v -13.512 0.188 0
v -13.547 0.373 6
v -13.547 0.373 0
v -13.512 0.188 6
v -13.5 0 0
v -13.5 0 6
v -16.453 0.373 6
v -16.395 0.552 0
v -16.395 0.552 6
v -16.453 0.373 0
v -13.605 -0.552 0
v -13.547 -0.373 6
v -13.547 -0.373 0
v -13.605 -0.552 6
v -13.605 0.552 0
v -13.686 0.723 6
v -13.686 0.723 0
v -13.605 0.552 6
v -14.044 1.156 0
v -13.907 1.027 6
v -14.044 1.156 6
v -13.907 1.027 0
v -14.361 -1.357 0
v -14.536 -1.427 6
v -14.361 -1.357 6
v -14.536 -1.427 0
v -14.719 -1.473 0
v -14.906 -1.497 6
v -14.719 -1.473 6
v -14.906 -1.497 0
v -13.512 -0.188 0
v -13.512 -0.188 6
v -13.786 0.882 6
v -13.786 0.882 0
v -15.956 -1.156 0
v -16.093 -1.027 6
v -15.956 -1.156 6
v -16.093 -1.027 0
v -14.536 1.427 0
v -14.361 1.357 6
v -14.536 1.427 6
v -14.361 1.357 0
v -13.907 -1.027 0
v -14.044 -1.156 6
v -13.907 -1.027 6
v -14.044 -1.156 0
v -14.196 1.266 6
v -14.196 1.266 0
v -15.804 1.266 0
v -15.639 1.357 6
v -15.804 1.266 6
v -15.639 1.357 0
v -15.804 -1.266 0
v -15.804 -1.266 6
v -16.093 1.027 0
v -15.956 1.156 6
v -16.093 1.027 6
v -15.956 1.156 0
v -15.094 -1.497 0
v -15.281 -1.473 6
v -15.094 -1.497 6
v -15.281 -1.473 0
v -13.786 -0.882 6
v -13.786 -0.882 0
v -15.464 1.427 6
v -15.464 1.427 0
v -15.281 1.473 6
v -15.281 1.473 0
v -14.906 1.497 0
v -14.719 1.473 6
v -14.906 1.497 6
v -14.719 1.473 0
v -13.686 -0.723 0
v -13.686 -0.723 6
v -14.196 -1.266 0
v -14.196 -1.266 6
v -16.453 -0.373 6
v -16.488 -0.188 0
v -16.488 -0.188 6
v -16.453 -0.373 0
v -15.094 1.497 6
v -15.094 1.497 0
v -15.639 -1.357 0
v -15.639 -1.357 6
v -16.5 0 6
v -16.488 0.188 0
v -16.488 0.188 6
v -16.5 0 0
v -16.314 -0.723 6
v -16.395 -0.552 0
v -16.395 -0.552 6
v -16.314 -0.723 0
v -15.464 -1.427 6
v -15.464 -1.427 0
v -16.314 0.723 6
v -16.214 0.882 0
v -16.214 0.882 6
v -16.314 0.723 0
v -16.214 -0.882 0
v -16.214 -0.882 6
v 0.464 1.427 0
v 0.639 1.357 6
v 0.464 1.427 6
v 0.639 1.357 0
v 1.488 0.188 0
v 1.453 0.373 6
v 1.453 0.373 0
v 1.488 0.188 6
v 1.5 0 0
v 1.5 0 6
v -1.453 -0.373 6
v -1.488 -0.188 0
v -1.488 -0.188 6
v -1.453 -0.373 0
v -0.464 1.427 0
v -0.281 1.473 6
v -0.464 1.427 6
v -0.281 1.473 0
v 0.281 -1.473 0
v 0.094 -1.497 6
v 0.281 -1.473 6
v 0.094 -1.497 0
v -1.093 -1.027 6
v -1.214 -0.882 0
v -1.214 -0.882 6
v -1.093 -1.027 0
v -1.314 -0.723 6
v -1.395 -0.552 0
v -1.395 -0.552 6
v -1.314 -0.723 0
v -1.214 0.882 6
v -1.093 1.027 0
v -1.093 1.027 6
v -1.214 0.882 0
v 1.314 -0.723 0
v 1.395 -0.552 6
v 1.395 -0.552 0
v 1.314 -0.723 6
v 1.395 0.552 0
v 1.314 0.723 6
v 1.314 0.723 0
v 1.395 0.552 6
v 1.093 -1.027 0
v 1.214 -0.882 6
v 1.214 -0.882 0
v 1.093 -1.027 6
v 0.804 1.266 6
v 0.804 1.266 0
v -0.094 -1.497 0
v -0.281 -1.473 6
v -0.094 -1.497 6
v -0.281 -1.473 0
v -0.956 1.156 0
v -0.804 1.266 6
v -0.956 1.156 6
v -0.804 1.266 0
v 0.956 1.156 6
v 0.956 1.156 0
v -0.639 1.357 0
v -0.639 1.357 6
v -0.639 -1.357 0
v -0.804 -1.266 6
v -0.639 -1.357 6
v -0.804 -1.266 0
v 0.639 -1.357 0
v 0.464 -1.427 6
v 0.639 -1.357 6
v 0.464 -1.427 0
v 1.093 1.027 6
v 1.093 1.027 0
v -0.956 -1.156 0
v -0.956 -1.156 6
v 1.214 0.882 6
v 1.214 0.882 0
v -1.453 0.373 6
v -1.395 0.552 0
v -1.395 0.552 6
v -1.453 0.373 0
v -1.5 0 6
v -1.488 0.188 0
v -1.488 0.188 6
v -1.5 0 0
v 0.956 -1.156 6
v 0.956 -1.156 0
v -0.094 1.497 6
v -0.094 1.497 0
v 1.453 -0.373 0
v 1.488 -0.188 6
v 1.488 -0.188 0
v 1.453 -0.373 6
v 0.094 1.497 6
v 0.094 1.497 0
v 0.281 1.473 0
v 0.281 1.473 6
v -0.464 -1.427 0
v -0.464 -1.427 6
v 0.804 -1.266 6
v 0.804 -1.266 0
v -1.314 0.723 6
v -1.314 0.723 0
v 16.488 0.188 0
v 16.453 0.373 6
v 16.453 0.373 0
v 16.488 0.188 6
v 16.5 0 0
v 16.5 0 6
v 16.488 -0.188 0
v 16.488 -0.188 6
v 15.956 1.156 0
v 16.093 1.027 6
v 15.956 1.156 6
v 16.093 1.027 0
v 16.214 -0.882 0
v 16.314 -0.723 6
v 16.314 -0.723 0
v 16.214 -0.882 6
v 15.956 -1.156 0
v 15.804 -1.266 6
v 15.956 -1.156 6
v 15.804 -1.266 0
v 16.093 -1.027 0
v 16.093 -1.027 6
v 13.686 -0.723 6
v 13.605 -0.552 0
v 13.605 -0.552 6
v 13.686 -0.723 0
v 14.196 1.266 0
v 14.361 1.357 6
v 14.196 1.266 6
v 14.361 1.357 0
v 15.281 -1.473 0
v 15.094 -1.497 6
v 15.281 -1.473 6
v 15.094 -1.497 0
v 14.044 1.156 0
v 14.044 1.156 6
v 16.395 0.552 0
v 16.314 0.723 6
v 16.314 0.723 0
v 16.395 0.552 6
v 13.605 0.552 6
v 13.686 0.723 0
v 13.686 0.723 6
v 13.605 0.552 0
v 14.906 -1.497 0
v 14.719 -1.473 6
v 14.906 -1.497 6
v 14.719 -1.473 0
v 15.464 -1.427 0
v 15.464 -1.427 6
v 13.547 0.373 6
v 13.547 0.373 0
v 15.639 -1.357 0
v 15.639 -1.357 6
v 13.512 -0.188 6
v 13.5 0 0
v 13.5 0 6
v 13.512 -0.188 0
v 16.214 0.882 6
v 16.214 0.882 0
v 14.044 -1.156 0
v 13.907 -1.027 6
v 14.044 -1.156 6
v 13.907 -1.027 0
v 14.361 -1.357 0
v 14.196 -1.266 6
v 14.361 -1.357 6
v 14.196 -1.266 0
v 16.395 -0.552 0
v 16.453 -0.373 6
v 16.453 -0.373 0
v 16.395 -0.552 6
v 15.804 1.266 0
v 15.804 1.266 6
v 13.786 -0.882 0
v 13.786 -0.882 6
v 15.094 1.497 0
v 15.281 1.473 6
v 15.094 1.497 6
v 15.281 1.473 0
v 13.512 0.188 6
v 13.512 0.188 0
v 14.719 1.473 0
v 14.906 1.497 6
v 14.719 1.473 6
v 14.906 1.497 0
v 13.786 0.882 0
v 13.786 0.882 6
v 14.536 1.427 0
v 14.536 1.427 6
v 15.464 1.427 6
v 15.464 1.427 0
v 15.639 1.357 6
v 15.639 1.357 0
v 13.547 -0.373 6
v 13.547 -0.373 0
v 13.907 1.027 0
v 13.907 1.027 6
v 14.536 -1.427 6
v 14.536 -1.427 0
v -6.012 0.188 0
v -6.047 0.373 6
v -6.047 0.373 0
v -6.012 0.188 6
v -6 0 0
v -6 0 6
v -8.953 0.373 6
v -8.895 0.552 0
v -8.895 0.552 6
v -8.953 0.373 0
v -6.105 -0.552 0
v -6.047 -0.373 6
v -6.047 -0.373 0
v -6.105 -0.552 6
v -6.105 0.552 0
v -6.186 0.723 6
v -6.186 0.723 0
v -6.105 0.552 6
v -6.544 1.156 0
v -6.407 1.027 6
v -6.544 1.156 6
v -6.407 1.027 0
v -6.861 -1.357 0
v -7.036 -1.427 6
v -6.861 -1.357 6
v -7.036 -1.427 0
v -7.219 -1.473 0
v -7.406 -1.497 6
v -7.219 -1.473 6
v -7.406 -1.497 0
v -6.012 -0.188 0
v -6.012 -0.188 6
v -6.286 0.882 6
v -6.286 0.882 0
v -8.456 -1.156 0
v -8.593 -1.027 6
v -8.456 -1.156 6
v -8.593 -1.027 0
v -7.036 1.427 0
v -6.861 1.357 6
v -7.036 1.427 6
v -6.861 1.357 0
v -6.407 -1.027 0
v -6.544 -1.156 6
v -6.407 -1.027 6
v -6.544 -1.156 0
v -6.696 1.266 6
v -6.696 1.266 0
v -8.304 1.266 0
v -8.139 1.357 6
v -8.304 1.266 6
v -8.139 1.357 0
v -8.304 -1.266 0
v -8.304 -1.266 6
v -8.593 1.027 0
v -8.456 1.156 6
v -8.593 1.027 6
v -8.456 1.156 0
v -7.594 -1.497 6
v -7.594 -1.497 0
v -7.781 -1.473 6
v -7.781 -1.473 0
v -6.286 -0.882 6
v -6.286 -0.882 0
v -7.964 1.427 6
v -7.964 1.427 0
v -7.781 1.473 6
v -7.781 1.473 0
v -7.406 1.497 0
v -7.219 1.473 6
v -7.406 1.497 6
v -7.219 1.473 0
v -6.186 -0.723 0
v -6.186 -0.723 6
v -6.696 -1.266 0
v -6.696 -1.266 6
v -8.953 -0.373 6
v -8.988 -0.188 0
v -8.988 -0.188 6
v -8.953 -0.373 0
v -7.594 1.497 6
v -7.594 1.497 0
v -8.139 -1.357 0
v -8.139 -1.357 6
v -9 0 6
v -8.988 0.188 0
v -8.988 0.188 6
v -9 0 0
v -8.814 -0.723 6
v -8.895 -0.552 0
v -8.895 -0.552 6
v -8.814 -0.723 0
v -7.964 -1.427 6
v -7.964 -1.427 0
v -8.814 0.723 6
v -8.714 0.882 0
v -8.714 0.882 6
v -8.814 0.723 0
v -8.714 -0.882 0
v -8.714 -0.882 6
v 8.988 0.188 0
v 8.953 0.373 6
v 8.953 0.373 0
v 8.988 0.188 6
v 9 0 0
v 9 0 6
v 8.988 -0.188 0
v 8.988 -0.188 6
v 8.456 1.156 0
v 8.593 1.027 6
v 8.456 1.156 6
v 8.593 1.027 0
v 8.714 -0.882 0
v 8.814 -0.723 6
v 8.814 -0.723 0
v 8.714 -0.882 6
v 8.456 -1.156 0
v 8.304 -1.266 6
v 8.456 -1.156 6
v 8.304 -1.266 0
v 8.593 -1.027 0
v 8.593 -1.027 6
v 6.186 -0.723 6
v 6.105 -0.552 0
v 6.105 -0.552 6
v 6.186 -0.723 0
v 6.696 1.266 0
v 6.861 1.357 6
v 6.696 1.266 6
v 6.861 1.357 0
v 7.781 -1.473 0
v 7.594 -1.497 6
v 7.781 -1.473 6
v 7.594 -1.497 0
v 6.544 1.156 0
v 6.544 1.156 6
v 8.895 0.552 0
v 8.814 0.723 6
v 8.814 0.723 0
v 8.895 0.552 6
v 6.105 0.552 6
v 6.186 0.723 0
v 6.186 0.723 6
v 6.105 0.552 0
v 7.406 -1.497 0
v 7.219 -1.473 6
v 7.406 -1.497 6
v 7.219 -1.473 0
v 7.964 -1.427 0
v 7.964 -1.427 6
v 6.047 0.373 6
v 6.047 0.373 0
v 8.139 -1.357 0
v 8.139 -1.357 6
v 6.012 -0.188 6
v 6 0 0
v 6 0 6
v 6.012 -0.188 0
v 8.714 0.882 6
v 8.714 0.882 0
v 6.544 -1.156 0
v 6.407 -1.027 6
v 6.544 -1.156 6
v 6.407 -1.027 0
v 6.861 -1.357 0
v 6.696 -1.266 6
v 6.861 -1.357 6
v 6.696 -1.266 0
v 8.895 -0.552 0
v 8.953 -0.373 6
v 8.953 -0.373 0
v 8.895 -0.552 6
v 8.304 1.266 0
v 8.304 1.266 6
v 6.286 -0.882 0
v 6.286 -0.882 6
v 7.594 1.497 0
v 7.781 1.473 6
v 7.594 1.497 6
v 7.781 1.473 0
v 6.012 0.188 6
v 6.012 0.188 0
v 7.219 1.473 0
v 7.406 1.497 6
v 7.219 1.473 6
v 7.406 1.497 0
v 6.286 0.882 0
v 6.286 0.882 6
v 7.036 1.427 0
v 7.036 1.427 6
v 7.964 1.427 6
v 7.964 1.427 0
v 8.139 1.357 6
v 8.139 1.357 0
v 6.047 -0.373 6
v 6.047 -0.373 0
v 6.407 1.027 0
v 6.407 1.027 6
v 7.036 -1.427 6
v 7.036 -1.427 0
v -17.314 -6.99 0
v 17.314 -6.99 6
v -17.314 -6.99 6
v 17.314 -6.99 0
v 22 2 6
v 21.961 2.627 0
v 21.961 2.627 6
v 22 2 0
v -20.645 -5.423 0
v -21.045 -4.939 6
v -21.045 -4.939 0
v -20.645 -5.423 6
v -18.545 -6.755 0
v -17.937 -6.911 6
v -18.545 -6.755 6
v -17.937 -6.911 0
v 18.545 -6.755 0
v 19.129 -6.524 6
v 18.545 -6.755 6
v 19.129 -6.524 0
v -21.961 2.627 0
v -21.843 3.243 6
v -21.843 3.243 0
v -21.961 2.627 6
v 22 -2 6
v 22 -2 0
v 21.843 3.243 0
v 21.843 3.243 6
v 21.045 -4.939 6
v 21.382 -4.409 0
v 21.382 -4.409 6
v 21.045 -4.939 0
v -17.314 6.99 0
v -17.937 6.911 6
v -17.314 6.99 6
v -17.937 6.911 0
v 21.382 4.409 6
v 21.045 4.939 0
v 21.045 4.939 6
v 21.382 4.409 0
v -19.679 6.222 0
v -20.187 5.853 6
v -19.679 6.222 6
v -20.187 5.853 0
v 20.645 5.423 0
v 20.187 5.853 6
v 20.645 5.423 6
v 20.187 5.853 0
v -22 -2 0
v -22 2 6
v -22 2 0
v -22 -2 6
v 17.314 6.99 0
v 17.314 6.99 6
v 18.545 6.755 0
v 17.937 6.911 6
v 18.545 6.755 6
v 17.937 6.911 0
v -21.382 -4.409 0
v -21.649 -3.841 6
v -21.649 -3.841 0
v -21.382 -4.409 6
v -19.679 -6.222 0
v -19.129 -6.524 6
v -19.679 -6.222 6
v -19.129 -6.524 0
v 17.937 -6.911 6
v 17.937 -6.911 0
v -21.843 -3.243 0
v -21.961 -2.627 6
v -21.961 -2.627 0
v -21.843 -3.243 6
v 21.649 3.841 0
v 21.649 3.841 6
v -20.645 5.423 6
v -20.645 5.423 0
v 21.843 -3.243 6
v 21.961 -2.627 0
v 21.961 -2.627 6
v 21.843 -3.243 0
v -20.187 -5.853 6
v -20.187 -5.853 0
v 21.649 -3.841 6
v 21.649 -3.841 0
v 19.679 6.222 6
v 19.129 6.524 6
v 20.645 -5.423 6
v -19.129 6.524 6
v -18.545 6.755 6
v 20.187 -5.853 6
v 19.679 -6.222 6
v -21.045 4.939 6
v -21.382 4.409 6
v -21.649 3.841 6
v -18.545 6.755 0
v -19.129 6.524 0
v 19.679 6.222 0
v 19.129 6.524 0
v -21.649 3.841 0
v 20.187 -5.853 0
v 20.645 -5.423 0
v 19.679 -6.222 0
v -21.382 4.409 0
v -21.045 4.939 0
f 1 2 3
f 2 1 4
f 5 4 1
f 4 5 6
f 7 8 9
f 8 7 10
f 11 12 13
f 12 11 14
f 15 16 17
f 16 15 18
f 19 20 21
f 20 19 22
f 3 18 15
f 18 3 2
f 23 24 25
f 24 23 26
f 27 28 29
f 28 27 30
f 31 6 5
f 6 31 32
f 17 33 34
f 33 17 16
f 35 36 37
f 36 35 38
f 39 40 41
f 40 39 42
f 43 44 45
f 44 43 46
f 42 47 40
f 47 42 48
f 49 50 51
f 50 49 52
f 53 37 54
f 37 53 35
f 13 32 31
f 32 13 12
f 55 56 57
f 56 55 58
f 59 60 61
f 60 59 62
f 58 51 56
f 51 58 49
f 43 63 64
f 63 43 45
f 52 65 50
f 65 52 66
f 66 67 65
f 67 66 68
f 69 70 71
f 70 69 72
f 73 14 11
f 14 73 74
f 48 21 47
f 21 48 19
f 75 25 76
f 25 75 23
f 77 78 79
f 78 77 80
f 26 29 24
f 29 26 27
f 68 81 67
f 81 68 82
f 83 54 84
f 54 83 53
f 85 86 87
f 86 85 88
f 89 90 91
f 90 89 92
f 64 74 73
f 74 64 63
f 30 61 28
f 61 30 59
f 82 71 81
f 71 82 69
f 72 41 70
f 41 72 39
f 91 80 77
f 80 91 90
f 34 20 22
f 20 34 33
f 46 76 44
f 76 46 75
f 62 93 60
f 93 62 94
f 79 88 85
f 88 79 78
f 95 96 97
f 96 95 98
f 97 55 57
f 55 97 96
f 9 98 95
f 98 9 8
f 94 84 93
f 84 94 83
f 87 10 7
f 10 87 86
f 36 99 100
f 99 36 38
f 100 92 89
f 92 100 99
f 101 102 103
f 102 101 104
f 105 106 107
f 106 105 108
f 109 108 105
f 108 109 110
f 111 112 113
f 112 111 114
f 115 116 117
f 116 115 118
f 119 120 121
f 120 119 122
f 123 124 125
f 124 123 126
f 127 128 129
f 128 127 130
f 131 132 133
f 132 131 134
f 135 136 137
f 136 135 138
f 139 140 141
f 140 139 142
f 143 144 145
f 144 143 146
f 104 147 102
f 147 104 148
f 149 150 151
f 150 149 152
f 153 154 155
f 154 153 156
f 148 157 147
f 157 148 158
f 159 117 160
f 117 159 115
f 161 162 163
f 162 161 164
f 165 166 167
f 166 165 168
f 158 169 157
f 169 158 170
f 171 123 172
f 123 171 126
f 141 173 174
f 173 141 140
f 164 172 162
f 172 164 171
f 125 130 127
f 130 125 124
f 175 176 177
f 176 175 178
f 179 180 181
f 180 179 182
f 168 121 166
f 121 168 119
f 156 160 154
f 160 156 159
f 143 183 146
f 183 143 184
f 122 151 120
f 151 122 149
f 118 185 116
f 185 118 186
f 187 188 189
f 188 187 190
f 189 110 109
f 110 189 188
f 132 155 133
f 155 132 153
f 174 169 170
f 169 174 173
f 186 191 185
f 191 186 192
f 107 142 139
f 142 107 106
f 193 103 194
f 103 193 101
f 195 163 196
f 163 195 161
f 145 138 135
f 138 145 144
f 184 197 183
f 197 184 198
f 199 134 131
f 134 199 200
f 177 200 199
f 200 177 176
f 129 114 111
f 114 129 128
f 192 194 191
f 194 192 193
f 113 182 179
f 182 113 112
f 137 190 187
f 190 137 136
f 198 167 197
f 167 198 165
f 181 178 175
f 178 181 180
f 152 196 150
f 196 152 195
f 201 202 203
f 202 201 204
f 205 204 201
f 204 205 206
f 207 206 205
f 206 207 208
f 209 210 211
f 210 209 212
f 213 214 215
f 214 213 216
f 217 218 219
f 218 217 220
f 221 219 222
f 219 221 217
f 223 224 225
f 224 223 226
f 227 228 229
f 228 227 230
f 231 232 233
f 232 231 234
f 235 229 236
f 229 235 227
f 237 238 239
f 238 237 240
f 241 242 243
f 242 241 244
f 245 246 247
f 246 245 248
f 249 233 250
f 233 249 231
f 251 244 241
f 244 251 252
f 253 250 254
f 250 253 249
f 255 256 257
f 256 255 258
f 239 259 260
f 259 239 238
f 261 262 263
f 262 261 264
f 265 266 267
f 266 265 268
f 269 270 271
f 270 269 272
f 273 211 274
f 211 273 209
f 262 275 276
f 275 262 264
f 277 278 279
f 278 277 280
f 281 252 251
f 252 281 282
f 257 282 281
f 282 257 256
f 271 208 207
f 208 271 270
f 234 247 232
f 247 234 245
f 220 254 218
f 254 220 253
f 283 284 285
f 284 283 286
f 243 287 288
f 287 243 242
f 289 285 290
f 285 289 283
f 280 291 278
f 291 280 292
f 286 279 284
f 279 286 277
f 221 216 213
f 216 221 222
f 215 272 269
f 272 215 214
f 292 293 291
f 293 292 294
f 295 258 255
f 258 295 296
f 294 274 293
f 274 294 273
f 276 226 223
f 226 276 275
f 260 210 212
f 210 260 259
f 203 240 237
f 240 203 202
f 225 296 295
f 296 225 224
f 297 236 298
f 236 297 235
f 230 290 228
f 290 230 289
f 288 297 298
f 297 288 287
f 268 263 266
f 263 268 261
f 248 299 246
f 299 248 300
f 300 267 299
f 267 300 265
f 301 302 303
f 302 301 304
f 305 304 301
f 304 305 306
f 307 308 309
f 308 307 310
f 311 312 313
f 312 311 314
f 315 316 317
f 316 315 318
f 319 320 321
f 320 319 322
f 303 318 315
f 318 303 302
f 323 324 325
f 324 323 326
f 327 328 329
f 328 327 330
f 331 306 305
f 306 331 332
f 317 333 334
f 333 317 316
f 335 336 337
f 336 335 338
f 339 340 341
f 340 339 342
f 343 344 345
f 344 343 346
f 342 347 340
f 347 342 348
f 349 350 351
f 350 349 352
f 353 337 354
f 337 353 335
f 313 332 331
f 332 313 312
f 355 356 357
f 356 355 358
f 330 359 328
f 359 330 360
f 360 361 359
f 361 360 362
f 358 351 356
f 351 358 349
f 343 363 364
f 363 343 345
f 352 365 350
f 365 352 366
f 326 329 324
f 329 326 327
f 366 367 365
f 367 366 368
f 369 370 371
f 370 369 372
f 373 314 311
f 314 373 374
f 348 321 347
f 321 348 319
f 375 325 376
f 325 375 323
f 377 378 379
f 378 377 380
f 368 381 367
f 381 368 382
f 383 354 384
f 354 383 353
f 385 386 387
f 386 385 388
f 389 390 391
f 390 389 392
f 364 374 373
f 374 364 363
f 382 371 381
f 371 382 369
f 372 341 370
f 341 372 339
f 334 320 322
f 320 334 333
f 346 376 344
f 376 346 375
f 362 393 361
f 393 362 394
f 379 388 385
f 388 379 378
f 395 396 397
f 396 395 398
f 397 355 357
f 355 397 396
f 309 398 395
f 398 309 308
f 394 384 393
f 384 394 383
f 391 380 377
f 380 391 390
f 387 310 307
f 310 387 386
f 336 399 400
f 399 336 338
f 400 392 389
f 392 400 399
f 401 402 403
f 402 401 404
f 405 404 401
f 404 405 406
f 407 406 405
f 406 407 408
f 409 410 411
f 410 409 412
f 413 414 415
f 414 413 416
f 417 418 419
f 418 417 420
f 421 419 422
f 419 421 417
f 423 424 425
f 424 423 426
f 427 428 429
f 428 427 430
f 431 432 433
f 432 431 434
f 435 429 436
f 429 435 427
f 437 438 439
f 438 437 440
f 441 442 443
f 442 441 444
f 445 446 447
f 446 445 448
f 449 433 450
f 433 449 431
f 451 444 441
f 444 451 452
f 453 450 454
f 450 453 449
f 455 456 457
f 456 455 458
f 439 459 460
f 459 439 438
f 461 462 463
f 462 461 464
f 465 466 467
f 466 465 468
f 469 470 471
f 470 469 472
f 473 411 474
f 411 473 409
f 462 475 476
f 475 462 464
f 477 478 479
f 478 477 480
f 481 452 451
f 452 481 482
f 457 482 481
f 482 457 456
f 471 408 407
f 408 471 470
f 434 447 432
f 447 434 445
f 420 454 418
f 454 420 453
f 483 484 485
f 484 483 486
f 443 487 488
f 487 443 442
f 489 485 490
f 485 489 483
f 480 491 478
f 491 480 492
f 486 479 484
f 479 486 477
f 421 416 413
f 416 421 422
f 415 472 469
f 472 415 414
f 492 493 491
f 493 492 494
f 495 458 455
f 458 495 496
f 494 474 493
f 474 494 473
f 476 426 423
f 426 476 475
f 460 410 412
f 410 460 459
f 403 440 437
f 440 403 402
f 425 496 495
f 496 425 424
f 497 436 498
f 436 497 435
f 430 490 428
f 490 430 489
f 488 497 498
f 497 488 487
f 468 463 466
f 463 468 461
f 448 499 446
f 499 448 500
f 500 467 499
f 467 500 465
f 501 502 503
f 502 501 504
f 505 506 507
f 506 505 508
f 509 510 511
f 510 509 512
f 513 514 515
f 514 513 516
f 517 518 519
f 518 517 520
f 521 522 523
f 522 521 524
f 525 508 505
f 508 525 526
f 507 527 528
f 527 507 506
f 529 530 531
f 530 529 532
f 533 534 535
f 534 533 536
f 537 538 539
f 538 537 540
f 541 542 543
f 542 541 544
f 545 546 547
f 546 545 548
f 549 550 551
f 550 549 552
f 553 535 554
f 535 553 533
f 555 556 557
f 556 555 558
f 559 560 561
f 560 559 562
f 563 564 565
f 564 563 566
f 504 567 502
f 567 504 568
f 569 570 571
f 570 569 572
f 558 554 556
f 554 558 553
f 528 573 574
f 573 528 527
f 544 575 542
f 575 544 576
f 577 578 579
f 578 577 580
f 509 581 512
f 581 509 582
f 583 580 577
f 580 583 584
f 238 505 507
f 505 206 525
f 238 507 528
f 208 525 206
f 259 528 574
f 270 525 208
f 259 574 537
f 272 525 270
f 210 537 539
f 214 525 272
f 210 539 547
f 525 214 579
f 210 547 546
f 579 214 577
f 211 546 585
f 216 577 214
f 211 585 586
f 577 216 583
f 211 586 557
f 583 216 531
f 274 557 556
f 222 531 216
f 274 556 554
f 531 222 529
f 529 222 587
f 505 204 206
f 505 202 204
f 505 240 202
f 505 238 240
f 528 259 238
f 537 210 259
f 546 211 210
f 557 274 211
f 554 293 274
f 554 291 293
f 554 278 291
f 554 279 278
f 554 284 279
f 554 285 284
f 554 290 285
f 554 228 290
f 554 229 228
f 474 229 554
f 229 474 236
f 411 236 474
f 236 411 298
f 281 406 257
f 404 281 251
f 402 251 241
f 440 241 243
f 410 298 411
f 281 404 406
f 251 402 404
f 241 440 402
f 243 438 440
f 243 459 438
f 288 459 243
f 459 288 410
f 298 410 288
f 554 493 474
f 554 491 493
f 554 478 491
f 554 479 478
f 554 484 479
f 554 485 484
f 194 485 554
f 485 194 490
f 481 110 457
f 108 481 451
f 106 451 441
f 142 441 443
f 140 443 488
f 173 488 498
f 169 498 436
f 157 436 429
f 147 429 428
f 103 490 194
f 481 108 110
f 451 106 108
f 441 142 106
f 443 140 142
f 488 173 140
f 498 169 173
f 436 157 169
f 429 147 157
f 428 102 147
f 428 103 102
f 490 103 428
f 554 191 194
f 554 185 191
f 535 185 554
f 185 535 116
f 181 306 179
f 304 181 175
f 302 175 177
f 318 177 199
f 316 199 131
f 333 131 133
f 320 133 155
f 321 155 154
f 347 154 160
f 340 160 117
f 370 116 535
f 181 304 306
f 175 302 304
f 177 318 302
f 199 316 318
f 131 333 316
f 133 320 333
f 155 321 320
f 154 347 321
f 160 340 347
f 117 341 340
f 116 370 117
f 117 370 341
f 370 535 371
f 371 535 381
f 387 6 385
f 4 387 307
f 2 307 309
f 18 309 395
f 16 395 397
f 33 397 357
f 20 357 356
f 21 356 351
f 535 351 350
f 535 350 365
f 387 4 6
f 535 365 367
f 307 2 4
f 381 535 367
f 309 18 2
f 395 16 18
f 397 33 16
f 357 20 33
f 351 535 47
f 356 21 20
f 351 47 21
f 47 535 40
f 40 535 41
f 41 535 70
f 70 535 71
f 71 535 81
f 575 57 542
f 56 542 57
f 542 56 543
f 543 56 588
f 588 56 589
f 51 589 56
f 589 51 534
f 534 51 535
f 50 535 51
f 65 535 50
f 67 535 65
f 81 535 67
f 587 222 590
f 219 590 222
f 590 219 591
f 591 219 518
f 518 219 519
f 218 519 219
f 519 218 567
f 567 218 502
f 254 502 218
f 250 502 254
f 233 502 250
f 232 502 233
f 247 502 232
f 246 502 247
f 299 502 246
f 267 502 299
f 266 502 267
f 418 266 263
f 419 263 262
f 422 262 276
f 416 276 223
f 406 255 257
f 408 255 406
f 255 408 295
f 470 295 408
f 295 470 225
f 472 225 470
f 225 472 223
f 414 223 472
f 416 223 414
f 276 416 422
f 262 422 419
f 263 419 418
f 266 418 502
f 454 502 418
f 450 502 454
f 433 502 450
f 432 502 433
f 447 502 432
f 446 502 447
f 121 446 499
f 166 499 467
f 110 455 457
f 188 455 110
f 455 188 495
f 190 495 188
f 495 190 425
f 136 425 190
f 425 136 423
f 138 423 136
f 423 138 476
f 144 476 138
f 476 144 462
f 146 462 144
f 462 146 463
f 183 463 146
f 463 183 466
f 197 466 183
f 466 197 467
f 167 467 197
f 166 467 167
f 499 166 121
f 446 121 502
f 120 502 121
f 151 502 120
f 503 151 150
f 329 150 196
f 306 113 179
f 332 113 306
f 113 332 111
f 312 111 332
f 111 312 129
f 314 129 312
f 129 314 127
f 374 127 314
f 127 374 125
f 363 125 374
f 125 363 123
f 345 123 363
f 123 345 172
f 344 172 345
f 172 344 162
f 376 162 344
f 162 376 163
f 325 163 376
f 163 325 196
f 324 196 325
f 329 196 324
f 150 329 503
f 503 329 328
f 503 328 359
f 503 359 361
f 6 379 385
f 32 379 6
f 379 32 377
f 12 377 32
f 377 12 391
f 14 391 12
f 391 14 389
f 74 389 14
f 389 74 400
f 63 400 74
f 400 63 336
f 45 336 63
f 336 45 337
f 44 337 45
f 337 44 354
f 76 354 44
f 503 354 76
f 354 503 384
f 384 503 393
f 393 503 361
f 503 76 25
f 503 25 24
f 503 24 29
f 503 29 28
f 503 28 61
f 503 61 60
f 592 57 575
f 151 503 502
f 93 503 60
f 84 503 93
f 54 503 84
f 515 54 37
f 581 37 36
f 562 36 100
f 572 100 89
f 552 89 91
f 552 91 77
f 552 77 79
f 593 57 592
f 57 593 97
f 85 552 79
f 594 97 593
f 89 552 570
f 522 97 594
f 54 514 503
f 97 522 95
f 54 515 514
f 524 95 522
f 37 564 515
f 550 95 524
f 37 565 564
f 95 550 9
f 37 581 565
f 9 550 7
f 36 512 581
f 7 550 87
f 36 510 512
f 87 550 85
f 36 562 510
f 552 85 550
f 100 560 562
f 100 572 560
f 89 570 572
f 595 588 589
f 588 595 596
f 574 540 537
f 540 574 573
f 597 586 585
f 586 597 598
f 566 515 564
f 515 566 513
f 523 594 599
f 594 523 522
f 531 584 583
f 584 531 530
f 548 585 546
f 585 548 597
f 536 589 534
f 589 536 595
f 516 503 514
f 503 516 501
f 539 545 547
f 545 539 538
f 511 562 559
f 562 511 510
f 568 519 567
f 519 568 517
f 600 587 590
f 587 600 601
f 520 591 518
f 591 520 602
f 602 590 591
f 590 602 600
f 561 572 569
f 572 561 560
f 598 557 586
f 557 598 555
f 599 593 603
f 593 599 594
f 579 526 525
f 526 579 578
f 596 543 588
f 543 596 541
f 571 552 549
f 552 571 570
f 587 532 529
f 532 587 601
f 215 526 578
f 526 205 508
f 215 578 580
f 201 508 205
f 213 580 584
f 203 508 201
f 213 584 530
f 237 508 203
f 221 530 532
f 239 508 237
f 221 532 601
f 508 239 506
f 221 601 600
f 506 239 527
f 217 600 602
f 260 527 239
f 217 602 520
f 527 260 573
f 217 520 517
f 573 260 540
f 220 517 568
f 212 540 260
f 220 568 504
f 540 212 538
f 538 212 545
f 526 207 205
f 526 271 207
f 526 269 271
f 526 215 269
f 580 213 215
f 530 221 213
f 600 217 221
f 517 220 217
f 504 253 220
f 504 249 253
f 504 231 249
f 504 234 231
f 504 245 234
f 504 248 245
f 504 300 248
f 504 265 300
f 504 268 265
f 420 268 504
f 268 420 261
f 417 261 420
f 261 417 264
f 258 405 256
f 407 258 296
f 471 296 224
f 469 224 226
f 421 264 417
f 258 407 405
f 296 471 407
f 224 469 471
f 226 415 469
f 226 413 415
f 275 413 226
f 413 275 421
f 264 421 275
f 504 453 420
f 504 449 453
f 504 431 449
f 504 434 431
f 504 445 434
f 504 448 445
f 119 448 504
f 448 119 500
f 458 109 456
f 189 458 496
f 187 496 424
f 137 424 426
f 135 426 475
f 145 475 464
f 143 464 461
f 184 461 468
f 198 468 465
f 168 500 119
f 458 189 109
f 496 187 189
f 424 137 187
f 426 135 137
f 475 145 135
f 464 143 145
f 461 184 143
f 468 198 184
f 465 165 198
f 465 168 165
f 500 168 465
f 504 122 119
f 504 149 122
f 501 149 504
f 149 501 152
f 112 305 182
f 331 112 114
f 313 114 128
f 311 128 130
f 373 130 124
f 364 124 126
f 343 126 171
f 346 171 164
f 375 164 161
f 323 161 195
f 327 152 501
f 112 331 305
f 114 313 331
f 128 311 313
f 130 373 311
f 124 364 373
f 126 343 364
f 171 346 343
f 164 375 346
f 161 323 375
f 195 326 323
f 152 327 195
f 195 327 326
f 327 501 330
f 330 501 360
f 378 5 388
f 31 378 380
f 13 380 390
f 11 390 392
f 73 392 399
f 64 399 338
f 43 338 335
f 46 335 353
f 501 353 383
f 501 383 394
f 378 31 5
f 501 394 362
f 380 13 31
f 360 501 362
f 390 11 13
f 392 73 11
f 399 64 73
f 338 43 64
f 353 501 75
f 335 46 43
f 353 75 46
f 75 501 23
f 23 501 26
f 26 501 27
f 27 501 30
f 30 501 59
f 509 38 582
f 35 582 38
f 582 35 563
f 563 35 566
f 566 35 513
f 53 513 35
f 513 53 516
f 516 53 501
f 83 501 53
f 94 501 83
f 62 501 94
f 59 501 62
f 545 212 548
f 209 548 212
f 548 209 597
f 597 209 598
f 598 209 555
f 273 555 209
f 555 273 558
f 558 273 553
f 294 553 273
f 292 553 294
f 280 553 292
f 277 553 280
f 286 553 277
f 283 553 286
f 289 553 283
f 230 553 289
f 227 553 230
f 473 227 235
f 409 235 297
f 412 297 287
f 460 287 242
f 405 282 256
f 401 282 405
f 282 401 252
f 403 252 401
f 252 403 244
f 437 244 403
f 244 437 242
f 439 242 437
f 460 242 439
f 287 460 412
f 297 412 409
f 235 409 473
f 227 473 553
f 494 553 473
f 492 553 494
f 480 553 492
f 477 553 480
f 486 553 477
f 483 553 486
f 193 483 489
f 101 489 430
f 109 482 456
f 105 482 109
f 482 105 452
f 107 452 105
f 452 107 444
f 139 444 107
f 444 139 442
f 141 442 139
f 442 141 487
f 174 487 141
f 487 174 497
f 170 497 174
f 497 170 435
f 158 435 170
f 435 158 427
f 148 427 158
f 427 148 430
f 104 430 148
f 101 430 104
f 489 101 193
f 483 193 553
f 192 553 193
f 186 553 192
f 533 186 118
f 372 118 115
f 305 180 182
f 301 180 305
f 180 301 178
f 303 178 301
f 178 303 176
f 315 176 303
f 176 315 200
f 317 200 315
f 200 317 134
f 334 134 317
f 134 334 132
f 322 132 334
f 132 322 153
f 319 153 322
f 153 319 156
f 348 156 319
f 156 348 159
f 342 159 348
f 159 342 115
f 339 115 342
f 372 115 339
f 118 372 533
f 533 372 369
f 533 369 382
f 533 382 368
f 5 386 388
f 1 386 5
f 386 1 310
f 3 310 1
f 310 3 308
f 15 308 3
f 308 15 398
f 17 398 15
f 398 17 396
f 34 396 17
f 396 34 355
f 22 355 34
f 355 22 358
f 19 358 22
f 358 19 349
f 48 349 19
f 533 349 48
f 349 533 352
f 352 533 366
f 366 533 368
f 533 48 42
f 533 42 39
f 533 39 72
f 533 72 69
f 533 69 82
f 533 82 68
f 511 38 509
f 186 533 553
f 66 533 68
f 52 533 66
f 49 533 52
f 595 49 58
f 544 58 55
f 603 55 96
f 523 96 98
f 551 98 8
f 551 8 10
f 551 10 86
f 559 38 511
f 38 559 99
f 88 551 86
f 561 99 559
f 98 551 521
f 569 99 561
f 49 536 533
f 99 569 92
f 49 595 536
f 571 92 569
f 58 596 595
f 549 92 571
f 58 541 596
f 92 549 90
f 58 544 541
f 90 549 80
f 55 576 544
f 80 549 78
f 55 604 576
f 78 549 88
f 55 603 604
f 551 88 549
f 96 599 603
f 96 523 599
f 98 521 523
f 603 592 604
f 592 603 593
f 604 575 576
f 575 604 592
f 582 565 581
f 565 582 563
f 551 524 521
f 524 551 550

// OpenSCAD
$fn = 50;


difference() {
	union() {
		hull() {
			translate(v = [-17.0000000000, 2.0000000000, 0]) {
				cylinder(h = 6, r = 5);
			}
			translate(v = [17.0000000000, 2.0000000000, 0]) {
				cylinder(h = 6, r = 5);
			}
			translate(v = [-17.0000000000, -2.0000000000, 0]) {
				cylinder(h = 6, r = 5);
			}
			translate(v = [17.0000000000, -2.0000000000, 0]) {
				cylinder(h = 6, r = 5);
			}
		}
	}
	union() {
		translate(v = [-15.0000000000, 0.0000000000, 0]) {
			translate(v = [0, 0, -100]) {
				cylinder(h = 200, r = 1.5000000000);
			}
		}
		translate(v = [0, 0, -100]) {
			cylinder(h = 200, r = 1.5000000000);
		}
		translate(v = [15.0000000000, 0.0000000000, 0]) {
			translate(v = [0, 0, -100]) {
				cylinder(h = 200, r = 1.5000000000);
			}
		}
		translate(v = [-15.0000000000, 0.0000000000, 0]) {
			translate(v = [0, 0, -100]) {
				cylinder(h = 200, r = 1.5000000000);
			}
		}
		translate(v = [-7.5000000000, 0.0000000000, 0]) {
			translate(v = [0, 0, -100]) {
				cylinder(h = 200, r = 1.5000000000);
			}
		}
		translate(v = [0, 0, -100]) {
			cylinder(h = 200, r = 1.5000000000);
		}
		translate(v = [7.5000000000, 0.0000000000, 0]) {
			translate(v = [0, 0, -100]) {
				cylinder(h = 200, r = 1.5000000000);
			}
		}
		translate(v = [15.0000000000, 0.0000000000, 0]) {
			translate(v = [0, 0, -100]) {
				cylinder(h = 200, r = 1.5000000000);
			}
		}
	}
}
